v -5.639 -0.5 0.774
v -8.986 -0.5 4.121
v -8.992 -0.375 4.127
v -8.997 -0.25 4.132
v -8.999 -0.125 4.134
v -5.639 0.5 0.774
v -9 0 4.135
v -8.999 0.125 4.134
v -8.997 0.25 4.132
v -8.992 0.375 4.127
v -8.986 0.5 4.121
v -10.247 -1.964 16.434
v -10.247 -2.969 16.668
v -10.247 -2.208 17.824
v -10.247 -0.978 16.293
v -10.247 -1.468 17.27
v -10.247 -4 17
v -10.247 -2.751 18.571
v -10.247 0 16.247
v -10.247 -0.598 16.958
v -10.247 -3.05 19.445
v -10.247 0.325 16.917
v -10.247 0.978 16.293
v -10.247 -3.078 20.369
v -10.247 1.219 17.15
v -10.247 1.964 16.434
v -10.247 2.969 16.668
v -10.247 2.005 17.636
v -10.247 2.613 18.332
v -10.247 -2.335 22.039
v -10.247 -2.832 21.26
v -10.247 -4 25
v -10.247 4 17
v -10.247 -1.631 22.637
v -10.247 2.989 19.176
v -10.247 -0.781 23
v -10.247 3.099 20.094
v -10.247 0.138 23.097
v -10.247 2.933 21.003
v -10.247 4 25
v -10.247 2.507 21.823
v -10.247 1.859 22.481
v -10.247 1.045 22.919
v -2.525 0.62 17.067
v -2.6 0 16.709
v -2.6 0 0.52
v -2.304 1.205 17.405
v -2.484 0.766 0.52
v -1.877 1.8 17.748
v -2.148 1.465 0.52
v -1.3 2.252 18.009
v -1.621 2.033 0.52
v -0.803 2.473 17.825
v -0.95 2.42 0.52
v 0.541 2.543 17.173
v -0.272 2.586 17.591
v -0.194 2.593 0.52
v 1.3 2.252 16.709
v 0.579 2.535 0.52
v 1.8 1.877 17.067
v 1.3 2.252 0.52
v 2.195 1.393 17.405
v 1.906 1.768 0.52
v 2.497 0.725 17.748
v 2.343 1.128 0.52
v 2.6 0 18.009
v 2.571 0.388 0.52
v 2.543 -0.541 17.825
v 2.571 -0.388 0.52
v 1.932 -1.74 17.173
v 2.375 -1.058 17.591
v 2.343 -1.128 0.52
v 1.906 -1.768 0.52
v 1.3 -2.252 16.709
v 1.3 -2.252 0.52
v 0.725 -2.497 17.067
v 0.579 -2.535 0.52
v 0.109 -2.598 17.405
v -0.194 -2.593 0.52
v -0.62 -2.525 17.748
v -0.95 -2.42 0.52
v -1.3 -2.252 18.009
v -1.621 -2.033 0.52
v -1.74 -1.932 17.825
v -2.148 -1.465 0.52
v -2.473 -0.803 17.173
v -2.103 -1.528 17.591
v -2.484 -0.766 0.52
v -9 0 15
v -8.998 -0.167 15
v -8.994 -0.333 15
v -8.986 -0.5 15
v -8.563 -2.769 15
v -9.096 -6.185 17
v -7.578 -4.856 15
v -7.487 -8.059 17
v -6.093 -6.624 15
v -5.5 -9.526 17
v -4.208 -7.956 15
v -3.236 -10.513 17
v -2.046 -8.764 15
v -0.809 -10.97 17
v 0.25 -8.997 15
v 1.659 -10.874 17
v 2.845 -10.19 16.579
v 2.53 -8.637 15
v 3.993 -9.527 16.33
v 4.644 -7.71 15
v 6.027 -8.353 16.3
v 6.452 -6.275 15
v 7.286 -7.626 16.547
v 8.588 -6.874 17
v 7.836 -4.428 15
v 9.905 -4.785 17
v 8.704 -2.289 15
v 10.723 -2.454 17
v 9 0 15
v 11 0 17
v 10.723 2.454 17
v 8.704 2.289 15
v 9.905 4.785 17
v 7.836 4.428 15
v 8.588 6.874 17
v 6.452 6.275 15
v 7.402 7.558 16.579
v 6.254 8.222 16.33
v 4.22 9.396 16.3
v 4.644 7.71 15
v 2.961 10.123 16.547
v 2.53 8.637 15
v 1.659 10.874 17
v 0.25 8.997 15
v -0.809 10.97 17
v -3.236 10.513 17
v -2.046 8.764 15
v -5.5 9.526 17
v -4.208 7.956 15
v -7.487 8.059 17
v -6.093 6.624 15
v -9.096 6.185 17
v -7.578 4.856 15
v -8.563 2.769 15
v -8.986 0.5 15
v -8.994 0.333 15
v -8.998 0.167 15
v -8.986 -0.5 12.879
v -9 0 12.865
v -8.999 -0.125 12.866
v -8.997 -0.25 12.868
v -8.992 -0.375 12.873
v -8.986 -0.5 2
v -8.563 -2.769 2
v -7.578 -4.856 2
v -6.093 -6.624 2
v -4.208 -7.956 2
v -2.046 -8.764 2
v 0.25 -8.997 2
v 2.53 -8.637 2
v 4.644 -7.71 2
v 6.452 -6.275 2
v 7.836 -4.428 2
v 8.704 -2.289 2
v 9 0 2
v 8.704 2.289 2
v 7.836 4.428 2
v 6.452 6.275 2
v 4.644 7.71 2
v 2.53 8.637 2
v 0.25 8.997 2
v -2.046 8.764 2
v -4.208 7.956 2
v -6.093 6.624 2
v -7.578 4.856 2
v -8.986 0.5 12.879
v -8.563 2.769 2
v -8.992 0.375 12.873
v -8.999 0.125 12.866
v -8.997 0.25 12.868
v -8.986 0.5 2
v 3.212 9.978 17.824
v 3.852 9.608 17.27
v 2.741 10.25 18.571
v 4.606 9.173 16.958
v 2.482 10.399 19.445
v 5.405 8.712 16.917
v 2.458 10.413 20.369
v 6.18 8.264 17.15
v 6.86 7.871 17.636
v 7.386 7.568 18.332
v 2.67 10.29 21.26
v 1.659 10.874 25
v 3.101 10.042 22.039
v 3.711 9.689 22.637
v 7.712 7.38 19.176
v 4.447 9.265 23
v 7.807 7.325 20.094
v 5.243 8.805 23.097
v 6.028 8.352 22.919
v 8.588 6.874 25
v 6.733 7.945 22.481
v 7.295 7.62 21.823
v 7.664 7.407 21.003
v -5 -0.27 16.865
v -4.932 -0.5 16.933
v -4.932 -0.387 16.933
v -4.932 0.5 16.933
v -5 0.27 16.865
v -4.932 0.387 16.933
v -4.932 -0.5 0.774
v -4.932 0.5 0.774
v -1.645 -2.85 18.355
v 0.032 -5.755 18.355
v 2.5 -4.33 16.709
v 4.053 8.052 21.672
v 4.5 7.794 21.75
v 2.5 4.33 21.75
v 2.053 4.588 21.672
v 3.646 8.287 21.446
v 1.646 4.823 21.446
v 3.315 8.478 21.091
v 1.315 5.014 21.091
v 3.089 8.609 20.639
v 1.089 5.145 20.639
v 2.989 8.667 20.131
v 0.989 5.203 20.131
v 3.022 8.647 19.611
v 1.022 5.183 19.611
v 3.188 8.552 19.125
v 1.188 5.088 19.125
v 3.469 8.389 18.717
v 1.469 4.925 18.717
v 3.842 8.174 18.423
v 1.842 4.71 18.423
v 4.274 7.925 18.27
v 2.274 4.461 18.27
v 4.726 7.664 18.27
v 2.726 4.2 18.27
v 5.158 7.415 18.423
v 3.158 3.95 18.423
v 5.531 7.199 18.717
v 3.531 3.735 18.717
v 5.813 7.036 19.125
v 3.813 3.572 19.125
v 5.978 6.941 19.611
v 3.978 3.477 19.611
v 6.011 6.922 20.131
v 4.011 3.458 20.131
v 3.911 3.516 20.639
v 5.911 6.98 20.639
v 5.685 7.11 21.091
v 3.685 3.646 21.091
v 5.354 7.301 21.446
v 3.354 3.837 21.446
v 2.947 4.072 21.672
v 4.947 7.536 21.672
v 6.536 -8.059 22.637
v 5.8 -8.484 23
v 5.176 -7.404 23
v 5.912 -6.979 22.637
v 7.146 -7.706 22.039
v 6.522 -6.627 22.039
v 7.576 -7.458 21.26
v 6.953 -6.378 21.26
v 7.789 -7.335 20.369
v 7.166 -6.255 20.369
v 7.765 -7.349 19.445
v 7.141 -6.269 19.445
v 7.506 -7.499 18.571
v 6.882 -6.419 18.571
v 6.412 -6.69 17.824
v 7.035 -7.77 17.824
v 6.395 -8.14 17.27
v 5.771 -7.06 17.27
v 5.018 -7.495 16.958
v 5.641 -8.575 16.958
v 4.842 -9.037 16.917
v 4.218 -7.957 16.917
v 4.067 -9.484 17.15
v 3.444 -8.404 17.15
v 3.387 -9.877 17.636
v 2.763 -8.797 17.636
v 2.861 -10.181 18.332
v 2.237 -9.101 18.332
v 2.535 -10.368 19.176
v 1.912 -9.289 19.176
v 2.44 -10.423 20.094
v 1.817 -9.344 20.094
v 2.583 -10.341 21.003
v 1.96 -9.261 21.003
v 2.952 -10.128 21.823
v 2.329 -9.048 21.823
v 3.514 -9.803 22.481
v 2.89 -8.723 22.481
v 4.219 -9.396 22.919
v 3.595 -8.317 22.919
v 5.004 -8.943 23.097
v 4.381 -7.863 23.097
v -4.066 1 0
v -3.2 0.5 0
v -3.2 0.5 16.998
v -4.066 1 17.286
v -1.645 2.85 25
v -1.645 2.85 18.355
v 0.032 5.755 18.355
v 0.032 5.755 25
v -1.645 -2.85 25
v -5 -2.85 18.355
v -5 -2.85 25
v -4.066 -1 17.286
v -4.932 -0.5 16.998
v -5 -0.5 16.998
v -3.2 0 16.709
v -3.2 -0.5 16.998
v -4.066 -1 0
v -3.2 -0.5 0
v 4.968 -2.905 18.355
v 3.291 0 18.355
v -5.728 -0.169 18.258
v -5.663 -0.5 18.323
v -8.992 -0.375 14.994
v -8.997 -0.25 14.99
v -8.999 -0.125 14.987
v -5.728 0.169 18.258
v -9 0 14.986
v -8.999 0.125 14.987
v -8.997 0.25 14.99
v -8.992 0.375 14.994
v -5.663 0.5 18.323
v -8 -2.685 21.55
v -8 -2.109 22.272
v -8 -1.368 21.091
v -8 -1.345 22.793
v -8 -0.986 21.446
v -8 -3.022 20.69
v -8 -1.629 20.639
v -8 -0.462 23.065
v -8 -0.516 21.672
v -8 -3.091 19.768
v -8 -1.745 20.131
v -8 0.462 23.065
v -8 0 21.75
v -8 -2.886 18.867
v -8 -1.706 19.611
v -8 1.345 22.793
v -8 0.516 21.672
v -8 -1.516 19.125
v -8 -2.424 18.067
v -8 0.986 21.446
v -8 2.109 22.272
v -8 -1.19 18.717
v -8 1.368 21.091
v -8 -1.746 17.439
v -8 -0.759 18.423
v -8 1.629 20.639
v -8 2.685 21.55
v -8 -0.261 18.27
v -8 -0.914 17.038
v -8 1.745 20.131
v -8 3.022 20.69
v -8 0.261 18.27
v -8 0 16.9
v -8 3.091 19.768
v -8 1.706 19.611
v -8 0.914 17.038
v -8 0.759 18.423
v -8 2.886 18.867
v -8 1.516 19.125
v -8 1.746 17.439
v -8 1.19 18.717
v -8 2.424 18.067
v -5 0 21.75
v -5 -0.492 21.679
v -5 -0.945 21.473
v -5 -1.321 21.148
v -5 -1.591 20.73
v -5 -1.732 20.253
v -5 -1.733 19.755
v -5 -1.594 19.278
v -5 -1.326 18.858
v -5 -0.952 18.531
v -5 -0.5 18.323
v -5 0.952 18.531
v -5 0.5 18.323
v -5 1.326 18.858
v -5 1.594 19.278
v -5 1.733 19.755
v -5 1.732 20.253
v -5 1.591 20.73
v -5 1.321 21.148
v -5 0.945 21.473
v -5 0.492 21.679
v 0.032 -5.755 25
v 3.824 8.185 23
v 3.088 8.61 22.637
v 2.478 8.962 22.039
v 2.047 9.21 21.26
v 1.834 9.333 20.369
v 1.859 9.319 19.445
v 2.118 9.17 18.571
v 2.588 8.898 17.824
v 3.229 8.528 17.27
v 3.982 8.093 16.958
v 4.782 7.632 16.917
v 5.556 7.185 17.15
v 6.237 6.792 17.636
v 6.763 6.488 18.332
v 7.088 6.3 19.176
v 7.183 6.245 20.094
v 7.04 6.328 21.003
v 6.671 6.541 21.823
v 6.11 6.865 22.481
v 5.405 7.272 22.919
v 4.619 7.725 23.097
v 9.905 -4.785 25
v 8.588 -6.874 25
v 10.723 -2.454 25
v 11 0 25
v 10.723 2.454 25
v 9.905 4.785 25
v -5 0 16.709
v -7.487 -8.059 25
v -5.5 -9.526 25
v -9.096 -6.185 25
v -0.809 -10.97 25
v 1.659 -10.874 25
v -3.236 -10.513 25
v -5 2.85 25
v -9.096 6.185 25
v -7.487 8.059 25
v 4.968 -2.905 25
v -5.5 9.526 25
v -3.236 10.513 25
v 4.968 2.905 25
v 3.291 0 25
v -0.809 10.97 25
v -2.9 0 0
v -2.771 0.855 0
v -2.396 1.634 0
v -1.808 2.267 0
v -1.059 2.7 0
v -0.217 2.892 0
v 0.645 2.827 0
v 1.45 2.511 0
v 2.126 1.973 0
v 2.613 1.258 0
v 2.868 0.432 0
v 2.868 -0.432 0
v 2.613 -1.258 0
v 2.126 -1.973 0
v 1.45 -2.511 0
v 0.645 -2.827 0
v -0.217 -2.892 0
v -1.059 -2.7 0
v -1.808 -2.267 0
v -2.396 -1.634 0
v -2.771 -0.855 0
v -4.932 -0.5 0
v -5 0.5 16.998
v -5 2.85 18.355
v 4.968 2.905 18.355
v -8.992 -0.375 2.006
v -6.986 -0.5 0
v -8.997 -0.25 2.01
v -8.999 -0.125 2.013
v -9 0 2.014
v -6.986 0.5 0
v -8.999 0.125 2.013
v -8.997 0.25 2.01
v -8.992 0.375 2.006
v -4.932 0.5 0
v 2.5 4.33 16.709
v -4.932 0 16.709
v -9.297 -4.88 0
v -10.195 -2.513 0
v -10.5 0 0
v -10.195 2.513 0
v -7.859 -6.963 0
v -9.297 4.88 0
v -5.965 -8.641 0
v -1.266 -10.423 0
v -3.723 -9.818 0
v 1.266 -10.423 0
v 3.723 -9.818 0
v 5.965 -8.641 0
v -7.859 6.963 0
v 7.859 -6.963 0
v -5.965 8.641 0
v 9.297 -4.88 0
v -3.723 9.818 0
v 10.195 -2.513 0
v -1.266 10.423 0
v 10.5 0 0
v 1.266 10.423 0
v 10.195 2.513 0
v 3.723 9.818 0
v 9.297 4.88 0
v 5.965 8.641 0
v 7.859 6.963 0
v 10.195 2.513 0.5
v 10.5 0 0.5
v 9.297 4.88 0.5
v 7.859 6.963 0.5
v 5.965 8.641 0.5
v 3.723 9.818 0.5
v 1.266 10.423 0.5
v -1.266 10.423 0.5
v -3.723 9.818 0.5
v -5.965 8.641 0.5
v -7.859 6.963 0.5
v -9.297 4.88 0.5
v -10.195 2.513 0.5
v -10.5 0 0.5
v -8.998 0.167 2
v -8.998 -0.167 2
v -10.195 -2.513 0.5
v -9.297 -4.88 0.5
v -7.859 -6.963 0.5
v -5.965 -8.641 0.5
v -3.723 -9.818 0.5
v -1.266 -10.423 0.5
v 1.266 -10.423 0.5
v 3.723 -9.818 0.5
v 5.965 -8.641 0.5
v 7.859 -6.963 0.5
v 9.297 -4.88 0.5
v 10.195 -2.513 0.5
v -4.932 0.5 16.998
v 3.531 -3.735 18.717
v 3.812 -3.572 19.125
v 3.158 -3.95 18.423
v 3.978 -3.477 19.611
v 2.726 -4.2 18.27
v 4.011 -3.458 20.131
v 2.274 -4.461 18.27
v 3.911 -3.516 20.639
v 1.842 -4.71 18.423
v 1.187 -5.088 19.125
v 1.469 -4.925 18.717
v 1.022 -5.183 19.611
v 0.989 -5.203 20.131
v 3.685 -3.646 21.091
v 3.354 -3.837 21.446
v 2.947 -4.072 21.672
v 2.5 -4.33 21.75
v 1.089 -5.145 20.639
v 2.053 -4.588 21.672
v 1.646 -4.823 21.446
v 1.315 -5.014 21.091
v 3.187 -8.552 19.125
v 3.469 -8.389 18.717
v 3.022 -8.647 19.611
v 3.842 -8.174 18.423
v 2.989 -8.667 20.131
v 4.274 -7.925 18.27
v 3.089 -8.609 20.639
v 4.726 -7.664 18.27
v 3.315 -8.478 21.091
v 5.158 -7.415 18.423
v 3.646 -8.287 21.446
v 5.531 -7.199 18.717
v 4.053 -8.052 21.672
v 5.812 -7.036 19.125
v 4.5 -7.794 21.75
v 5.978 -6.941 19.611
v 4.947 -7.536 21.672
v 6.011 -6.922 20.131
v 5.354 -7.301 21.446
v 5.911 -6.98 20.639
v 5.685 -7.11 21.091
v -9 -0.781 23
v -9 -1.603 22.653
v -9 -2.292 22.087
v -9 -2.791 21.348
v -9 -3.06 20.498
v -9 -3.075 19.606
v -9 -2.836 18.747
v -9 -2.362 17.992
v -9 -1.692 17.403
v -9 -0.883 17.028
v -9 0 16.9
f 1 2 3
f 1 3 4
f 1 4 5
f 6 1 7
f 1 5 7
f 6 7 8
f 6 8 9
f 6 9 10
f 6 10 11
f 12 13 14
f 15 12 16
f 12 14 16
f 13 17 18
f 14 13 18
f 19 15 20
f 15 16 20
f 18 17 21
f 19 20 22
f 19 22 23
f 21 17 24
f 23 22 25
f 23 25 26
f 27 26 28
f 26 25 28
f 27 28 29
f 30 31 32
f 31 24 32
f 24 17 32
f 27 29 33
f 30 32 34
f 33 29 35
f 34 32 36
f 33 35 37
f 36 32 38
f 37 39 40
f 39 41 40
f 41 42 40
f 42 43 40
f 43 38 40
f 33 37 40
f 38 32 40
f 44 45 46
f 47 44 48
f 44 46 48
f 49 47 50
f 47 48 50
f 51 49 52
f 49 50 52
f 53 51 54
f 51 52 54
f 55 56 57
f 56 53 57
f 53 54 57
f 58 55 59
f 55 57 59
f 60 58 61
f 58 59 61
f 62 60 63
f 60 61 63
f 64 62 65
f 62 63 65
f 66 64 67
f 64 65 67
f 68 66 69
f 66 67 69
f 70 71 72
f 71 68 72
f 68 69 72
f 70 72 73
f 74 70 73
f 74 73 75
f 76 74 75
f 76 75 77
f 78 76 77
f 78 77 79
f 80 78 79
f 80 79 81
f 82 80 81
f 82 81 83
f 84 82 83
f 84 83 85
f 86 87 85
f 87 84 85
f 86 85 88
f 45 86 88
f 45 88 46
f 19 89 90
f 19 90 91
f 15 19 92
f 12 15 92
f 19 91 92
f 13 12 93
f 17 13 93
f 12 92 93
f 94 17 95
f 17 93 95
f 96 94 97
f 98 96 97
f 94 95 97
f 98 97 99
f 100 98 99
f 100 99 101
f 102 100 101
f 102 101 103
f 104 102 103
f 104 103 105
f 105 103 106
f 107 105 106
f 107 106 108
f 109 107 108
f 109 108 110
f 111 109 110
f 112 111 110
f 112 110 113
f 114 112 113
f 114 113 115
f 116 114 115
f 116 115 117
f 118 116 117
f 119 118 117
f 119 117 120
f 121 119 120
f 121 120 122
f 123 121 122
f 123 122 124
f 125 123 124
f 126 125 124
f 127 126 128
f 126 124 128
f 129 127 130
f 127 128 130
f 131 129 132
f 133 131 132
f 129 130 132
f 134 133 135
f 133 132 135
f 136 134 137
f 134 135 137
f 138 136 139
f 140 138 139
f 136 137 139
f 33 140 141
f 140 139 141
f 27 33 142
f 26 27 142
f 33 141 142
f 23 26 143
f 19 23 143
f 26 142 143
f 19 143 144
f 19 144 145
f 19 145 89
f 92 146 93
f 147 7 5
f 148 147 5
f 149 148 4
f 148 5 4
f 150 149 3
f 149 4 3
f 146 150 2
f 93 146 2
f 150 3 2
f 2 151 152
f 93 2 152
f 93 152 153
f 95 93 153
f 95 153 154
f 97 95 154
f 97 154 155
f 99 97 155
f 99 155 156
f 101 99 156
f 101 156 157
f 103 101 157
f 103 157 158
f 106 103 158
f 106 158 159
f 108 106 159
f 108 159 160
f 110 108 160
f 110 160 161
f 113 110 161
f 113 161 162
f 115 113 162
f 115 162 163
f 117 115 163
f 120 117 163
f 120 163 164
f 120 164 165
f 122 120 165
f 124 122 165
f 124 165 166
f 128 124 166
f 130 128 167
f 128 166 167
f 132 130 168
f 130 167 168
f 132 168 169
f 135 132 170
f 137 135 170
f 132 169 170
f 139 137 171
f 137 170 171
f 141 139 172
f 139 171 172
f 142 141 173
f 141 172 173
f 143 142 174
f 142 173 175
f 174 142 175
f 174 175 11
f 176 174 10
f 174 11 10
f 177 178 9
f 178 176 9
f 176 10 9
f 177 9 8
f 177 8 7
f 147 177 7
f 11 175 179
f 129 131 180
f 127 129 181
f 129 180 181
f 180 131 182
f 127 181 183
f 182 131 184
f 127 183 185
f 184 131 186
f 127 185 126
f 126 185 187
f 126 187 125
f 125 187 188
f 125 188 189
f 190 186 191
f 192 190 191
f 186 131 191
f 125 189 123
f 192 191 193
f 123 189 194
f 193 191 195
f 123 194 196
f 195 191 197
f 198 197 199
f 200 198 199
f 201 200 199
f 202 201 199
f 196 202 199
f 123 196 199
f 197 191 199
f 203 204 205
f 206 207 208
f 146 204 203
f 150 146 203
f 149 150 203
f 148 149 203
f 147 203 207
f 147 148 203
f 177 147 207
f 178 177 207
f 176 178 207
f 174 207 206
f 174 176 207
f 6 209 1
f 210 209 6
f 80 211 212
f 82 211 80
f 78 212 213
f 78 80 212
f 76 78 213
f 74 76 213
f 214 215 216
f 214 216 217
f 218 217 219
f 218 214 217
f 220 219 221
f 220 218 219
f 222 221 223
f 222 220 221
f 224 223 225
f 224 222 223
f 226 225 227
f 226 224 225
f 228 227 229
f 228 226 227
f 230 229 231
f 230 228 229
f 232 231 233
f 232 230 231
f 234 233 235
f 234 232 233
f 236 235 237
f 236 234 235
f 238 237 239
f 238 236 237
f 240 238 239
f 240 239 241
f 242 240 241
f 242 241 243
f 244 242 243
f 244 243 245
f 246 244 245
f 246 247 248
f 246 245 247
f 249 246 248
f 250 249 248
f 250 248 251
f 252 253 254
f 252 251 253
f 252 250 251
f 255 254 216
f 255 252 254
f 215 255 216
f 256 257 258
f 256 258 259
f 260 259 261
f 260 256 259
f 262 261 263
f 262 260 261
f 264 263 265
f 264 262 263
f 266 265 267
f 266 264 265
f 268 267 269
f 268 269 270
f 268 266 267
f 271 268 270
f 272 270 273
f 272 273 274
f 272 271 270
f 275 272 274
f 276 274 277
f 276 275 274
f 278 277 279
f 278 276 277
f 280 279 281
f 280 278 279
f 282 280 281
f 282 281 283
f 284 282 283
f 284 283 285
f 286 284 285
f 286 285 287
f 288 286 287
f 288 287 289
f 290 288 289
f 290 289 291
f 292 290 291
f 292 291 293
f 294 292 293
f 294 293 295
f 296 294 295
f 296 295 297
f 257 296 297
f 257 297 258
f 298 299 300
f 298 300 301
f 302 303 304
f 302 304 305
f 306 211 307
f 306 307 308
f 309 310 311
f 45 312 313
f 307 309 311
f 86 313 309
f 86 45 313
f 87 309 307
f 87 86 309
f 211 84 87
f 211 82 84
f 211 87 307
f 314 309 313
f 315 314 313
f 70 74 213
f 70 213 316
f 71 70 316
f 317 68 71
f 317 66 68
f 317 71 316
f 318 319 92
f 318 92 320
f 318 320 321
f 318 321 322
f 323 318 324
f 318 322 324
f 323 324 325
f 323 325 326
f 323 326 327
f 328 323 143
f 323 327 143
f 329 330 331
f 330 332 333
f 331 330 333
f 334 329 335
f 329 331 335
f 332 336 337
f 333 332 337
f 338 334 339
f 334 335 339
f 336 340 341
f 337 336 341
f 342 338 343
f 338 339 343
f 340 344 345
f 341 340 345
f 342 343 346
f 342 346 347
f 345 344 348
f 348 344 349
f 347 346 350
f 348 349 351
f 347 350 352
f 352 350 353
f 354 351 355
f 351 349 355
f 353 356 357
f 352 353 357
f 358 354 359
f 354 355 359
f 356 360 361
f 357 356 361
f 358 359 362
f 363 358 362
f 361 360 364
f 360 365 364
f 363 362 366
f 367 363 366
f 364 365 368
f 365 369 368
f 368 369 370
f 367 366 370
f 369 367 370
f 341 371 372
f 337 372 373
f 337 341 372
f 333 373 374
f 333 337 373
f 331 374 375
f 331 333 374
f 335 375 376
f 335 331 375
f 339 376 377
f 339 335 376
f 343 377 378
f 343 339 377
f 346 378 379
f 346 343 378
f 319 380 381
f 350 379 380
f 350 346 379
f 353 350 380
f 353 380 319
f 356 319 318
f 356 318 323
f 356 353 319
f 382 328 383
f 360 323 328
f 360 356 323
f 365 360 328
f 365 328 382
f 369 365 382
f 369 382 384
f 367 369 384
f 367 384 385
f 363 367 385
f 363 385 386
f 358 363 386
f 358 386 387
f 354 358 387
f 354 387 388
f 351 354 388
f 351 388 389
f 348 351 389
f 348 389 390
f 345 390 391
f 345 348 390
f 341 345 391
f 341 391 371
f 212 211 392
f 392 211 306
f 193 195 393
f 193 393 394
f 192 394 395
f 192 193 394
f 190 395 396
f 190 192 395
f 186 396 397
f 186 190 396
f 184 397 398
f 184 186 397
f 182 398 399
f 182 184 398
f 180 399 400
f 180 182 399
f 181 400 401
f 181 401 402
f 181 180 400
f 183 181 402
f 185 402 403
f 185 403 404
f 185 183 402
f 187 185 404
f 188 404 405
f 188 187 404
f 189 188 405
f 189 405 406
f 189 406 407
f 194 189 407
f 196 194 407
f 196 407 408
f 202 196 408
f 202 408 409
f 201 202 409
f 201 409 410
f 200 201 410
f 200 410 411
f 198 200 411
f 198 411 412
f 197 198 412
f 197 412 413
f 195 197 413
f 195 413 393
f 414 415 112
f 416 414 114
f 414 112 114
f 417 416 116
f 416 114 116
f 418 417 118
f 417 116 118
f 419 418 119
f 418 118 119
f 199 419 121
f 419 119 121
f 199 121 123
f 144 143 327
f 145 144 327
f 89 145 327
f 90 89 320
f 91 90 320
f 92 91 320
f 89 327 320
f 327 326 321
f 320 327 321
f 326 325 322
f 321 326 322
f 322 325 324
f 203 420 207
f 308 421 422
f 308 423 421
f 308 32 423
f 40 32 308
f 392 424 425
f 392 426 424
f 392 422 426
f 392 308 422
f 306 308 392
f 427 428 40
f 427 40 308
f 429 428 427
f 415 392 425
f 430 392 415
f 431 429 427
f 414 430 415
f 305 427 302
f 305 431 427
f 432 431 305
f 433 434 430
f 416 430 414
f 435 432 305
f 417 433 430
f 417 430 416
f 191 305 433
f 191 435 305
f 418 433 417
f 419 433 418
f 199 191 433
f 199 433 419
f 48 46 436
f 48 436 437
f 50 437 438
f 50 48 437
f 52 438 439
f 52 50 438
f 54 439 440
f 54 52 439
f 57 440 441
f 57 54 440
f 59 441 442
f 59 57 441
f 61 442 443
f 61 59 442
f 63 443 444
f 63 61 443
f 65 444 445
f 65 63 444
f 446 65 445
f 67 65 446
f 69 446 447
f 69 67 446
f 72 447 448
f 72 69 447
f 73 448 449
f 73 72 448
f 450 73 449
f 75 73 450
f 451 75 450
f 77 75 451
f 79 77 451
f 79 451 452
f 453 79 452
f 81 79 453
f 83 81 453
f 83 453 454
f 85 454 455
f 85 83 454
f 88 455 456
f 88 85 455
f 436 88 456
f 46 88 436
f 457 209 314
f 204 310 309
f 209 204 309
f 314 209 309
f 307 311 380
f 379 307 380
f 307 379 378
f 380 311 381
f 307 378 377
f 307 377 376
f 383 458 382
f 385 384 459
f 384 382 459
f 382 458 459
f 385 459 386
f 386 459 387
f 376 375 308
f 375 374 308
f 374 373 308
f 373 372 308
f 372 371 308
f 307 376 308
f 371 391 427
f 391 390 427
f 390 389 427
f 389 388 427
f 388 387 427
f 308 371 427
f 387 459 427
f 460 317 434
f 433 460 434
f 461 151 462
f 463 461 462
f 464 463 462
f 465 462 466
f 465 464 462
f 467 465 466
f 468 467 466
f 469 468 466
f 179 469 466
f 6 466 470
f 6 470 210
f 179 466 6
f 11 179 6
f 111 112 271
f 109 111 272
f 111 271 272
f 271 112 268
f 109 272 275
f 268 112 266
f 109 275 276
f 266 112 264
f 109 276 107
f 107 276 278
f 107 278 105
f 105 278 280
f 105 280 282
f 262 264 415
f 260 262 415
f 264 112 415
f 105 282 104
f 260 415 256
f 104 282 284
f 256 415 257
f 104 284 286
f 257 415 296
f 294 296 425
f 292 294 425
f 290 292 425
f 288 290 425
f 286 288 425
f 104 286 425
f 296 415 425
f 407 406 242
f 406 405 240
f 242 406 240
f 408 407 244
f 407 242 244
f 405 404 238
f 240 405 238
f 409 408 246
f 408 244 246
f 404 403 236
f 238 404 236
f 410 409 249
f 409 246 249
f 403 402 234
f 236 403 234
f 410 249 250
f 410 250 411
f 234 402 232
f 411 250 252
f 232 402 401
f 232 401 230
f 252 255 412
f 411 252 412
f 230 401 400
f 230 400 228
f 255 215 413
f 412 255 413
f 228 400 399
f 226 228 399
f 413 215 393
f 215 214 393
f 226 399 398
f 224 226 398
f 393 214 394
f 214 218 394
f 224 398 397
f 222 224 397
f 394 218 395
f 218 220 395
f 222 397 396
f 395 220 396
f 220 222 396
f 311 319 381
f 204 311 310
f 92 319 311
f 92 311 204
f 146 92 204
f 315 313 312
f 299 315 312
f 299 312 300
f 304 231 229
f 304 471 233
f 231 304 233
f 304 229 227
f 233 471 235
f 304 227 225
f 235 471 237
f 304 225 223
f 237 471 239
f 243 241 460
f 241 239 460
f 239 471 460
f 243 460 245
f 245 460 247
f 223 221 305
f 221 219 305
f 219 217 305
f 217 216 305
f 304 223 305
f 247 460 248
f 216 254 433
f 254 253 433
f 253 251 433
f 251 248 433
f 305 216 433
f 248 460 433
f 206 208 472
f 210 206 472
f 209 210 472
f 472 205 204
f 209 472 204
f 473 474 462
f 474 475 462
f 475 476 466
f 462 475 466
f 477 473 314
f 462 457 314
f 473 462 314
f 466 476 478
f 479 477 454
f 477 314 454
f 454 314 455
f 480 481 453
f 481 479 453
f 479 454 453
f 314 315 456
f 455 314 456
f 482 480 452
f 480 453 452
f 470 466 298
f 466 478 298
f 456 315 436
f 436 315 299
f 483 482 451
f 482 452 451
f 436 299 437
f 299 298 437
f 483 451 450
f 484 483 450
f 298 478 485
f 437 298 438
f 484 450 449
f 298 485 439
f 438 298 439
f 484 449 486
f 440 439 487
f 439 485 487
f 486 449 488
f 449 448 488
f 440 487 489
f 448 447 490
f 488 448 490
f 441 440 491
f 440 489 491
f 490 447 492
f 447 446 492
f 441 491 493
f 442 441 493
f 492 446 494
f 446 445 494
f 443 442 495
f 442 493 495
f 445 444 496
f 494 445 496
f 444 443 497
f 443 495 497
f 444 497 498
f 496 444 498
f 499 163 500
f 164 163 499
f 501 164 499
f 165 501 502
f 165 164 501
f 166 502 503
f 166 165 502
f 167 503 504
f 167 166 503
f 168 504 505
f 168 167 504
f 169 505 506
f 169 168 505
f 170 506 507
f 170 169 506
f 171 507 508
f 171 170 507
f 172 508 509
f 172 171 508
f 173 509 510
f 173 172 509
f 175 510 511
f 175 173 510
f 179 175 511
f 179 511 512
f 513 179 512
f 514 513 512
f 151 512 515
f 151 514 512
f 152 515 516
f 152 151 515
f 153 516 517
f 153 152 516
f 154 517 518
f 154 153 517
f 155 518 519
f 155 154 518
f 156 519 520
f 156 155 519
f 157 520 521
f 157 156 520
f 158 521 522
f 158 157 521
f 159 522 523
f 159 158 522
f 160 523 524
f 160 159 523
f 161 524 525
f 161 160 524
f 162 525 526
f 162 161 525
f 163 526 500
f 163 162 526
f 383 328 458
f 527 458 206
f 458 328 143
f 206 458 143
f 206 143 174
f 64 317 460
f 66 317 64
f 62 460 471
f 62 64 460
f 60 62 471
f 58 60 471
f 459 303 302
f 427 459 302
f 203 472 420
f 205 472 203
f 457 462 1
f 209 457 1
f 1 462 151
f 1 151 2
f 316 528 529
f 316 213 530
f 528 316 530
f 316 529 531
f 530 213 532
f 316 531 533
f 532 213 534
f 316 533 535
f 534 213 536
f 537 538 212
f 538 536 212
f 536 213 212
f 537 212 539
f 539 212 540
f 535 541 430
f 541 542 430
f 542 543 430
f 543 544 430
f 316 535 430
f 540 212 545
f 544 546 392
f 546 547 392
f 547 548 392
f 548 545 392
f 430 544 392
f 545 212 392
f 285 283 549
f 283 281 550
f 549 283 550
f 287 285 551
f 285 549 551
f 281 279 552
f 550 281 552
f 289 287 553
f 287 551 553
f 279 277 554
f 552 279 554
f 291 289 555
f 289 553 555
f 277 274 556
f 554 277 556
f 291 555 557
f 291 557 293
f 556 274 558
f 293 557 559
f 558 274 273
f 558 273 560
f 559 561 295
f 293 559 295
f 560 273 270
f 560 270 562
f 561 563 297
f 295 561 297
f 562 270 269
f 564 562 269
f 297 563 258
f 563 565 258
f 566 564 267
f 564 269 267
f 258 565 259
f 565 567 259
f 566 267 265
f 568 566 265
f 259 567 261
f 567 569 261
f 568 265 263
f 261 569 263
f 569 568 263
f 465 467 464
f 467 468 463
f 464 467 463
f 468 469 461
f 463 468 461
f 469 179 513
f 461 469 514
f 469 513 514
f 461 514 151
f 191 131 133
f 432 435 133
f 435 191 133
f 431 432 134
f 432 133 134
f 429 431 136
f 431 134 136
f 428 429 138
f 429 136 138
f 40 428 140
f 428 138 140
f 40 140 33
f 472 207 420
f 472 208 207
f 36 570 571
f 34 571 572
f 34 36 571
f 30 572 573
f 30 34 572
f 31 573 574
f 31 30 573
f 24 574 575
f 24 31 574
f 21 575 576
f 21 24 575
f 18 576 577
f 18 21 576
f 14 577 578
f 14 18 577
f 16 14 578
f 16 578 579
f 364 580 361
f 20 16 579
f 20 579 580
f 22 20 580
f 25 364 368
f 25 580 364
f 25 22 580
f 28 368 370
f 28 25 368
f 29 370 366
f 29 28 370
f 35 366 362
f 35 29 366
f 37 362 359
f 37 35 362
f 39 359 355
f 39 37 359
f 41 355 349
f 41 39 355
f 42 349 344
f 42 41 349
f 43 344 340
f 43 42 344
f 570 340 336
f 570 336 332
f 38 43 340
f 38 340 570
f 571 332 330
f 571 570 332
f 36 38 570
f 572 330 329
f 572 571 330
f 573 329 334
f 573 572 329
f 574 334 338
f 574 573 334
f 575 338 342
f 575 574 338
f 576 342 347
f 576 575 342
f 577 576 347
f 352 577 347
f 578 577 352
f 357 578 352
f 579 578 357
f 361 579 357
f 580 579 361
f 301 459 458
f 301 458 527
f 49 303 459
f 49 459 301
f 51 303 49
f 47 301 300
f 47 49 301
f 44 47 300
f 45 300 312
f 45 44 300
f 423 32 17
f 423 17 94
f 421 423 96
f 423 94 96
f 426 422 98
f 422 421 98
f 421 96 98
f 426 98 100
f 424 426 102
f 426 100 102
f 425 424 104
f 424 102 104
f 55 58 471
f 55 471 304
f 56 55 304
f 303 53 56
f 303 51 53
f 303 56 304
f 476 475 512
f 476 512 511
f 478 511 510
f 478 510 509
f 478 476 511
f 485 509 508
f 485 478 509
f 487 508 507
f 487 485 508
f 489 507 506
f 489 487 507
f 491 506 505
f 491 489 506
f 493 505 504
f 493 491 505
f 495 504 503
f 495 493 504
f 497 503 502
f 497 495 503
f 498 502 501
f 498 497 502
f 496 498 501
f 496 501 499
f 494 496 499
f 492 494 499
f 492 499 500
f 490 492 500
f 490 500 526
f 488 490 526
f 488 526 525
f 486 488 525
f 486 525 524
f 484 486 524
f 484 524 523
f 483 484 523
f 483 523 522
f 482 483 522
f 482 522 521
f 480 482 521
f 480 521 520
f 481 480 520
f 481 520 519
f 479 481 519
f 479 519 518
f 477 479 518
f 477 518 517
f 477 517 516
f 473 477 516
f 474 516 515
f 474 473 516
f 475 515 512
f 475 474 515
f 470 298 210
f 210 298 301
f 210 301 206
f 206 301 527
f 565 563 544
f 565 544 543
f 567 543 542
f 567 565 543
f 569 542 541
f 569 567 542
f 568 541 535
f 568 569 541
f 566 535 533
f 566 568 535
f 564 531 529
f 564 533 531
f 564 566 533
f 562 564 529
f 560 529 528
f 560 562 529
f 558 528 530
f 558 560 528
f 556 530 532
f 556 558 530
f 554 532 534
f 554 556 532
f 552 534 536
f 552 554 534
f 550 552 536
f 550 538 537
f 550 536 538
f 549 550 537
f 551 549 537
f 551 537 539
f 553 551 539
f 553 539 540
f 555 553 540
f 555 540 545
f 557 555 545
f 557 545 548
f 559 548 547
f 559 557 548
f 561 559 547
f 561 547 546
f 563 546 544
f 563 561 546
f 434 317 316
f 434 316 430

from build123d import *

# Parameters (mm, degrees)
SKETCH1_R                     = 11
BOSS_BASE_FLANGE_DEPTH        = 2
BOSS_BASE_FLANGE_TAPER        = 45
SKETCH2_R                     = 9
BOSS_SPECTRA_SPOOL_DEPTH      = 13
SKETCH3_R                     = 9
BOSS_TOP_FLANGE_DEPTH         = 2
BOSS_TOP_FLANGE_DRAFT         = -45
SKETCH4_R                     = 11
BOSS_TOP_EXTENSION_DEPTH      = 8
SKETCH5_R                     = 2.6
CUT_STEPPER_SHAFT_DEPTH       = 30.444863729
CUT_SET_SCREW_HOLE_REACH      = 37.071
CUT_SET_SCREW_HOLE_END_RADIUS = 2.6
SKETCH7_R                     = 1.75
SKETCH8_R                     = 3.1
CUT_SCREW_HEAD_SLOT_DEPTH     = 2
CUT_FLATEN_REACH              = 31.445
SKETCH6_W                     = 0.753049234
SKETCH6_H                     = 8
CUT_NUT_HOLE_DEPTH            = 5
SKETCH11_W                    = 3.354551733
SKETCH11_H                    = 5.7
CUT_NUT_SLOT_DEPTH            = 5
CIRPATTERN1_COUNT             = 3
CUT_THREAD_HOLE_DEPTH         = 30.444863729
SKETCH15_W                    = 1.5
SKETCH15_H                    = 1
CUT_EXTRUDE8_DEPTH            = 28.81186797
CHAMFER1_SIZE                 = 1
CHAMFER1_SIZE2                = 0.707106781
CHAMFER3_SIZE                 = 0.3
CHAMFER3_SIZE2                = 0.519615242
SKETCH16_OUTSIDE_W            = 31.982
SKETCH16_OUTSIDE_H            = 31.982
SKETCH16_OUTSIDE_R            = 10.5
CUT_TRUNCATE_BASE_DEPTH       = 5
SKETCH8_2_R                   = 3.1
CUT_EXTRUDE9_DEPTH            = 3


with BuildPart() as part:
    # Sketch1 → Boss-Base Flange (new body)
    with BuildSketch(Plane.XY):
        Circle(SKETCH1_R)
    extrude(amount=BOSS_BASE_FLANGE_DEPTH, taper=BOSS_BASE_FLANGE_TAPER)

    # Sketch2 → Boss-Spectra Spool (add)
    with BuildSketch(Plane.XY.offset(2)):
        with Locations(Location((0, 0, 0), (0, 0, 180))):
            Circle(SKETCH2_R)
    extrude(amount=BOSS_SPECTRA_SPOOL_DEPTH)


with BuildPart() as boss_top_flange_tool:
    # Sketch3 → Boss-Top Flange (with draft: the straight prism first)
    with BuildSketch(Plane.XY.offset(15)):
        with Locations(Location((0, 0, 0), (0, 0, 180))):
            Circle(SKETCH3_R)
    extrude(amount=BOSS_TOP_FLANGE_DEPTH)
    # Boss-Top Flange: the draft: its side faces are tilted about the plane it starts from
    boss_top_flange_sides = [boss_top_flange_tool.faces().sort_by_distance(p)[0] for p in [
        (9, 0, 16),
    ]]
    draft(boss_top_flange_sides, Plane.XY.offset(15), BOSS_TOP_FLANGE_DRAFT)


with BuildPart() as part_1:
    add(part.part)

    # Boss-Top Flange: add boss_top_flange_tool
    add(boss_top_flange_tool.part)

    # Sketch4 → Boss-Top Extension (add)
    with BuildSketch(Plane.XY.offset(17)):
        Circle(SKETCH4_R)
    extrude(amount=BOSS_TOP_EXTENSION_DEPTH)

    # Sketch5 → Cut-Stepper Shaft (cut, through all)
    with BuildSketch(Plane(origin=(0, 0, 0), x_dir=(-1, 0, 0), z_dir=(0, 0, -1))):
        Circle(SKETCH5_R)
    extrude(amount=-CUT_STEPPER_SHAFT_DEPTH, mode=Mode.SUBTRACT)

    # Cut-Set Screw Hole: up to this cylinder (the profile starts outside it)
    cut_set_screw_hole_end = Plane(origin=(0, 0, 20), z_dir=(0, 0, -1)) * Cylinder(CUT_SET_SCREW_HOLE_END_RADIUS, 80.342, mode=Mode.PRIVATE)
    # Sketch7 → Cut-Set Screw Hole (cut, up to the surface)
    with BuildSketch(Plane(origin=(-11, 0, 0), x_dir=(0, 0, -1), z_dir=(1, 0, 0)), mode=Mode.PRIVATE) as cut_set_screw_hole_sk1:
        with Locations(Location((-20, 0, 0), (0, 0, 180))):
            Circle(SKETCH7_R)
    cut_set_screw_hole_tool1 = extrude(cut_set_screw_hole_sk1.sketch, amount=CUT_SET_SCREW_HOLE_REACH, mode=Mode.PRIVATE) - cut_set_screw_hole_end
    cut_set_screw_hole = cut_set_screw_hole_tool1.solids().sort_by_distance((-11, 0, 20))[0]
    add(cut_set_screw_hole, mode=Mode.SUBTRACT)

    # Sketch8 → Cut-Screw Head Slot (cut)
    with BuildSketch(Plane(origin=(-11, 0, 0), x_dir=(0, 0, -1), z_dir=(1, 0, 0))):
        with Locations(Location((-20, 0, 0), (0, 0, 194.592594316))):
            Circle(SKETCH8_R)
    cut_screw_head_slot = extrude(amount=CUT_SCREW_HEAD_SLOT_DEPTH, mode=Mode.SUBTRACT)

    # Cut-Flaten: up to this cone (the profile starts inside it)
    cut_flaten_end = Plane(origin=(0, 0, 25), z_dir=(0, 0, 1)).offset(-18.999999) * Cone(1e-06, 69.945, 69.944999, align=(Align.CENTER, Align.CENTER, Align.MIN), mode=Mode.PRIVATE)
    # Sketch6 → Cut-Flaten (cut, up to the surface)
    with BuildSketch(Plane.XY.offset(25), mode=Mode.PRIVATE) as cut_flaten_sk1:
        with Locations((-10.623475383, 0)):
            Rectangle(SKETCH6_W, SKETCH6_H)
    cut_flaten_tool1 = extrude(cut_flaten_sk1.sketch, amount=-CUT_FLATEN_REACH, mode=Mode.PRIVATE) & cut_flaten_end
    cut_flaten = cut_flaten_tool1.solids().sort_by_distance((-10.623475, 0, 25))[0]
    add(cut_flaten, mode=Mode.SUBTRACT)

    # Sketch10 → Cut-Nut Hole (cut)
    with BuildSketch(Plane.ZY):
        Polygon((23.290896534, 0), (21.645448267, 2.85), (18.354551733, 2.85), (16.709103466, 0), (18.354551733, -2.85), (21.645448267, -2.85), align=None)
    cut_nut_hole = extrude(amount=CUT_NUT_HOLE_DEPTH, mode=Mode.SUBTRACT)

    # Sketch11 → Cut-Nut Slot (cut)
    with BuildSketch(Plane.ZY):
        with Locations((23.322724134, 0)):
            Rectangle(SKETCH11_W, SKETCH11_H)
    cut_nut_slot = extrude(amount=CUT_NUT_SLOT_DEPTH, mode=Mode.SUBTRACT)

    # CirPattern1: Cut-Set Screw Hole, Cut-Screw Head Slot, Cut-Flaten, Cut-Nut Hole, Cut-Nut Slot ×3 about axis
    cirpattern1_axis = Axis((0, 0, 0), (0, 0, 1))
    add([cut_set_screw_hole.rotate(cirpattern1_axis, i * 360 / CIRPATTERN1_COUNT) for i in range(1, CIRPATTERN1_COUNT)], mode=Mode.SUBTRACT)
    add([cut_screw_head_slot.rotate(cirpattern1_axis, i * 360 / CIRPATTERN1_COUNT) for i in range(1, CIRPATTERN1_COUNT)], mode=Mode.SUBTRACT)
    add([cut_flaten.rotate(cirpattern1_axis, i * 360 / CIRPATTERN1_COUNT) for i in range(1, CIRPATTERN1_COUNT)], mode=Mode.SUBTRACT)
    add([cut_nut_hole.rotate(cirpattern1_axis, i * 360 / CIRPATTERN1_COUNT) for i in range(1, CIRPATTERN1_COUNT)], mode=Mode.SUBTRACT)
    add([cut_nut_slot.rotate(cirpattern1_axis, i * 360 / CIRPATTERN1_COUNT) for i in range(1, CIRPATTERN1_COUNT)], mode=Mode.SUBTRACT)

    # Sketch13 → Cut-Thread Hole (cut, through all)
    with BuildSketch(Plane.XY.offset(25)):
        Polygon((-4.066025404, 1), (-4.932050808, 0.5), (-4.932050808, -0.5), (-4.066025404, -1), (-3.2, -0.5), (-3.2, 0.5), align=None)
    extrude(amount=-CUT_THREAD_HOLE_DEPTH, mode=Mode.SUBTRACT)

    # Sketch15 → Cut-Extrude8 (cut, symmetric)
    with BuildSketch(Plane(origin=(-5.5, 0, 5.5), x_dir=(0.7071067811865464, 0, 0.7071067811865488), z_dir=(-0.7071067811865488, 0, 0.7071067811865464))):
        with Locations((-4.189918951, 0)):
            Rectangle(SKETCH15_W, SKETCH15_H)
    cut_extrude8 = extrude(amount=CUT_EXTRUDE8_DEPTH, both=True, mode=Mode.SUBTRACT)

    # Chamfer1
    chamfer1_edges = [part_1.edges().sort_by_distance(p)[0] for p in [
        (-4.932050808, 0, 0.067270773),
    ]]
    chamfer1_side = [part_1.faces().sort_by_distance(p)[0] for p in [
        (-6.963711629, 0, 2.098931595),
    ]]
    chamfer(chamfer1_edges, length=CHAMFER1_SIZE, length2=CHAMFER1_SIZE2, reference=chamfer1_side[0])

    # Mirror1: Cut-Extrude8 across plane
    add(cut_extrude8.mirror(Plane.XY.offset(8.5)), mode=Mode.SUBTRACT)

    # Chamfer3
    chamfer3_edges = [part_1.edges().sort_by_distance(p)[0] for p in [
        (2.6, 0, 0),
    ]]
    chamfer3_side = [part_1.faces().sort_by_distance(p)[0] for p in [
        (-10.688873016, 0, 0),
    ]]
    chamfer(chamfer3_edges, length=CHAMFER3_SIZE, length2=CHAMFER3_SIZE2, reference=chamfer3_side[0])

    # Sketch16 outside → Cut-Truncate Base (cut)
    with BuildSketch(Plane(origin=(0, 0, 0), x_dir=(-1, 0, 0), z_dir=(0, 0, -1))):
        Rectangle(SKETCH16_OUTSIDE_W, SKETCH16_OUTSIDE_H)
        Circle(SKETCH16_OUTSIDE_R, mode=Mode.SUBTRACT)
    extrude(amount=-CUT_TRUNCATE_BASE_DEPTH, mode=Mode.SUBTRACT)

    # Sketch8<2> → Cut-Extrude9 (cut)
    with BuildSketch(Plane(origin=(-11, 0, 0), x_dir=(0, 0, -1), z_dir=(1, 0, 0))):
        with Locations((-20, 0)):
            Circle(SKETCH8_2_R)
    extrude(amount=CUT_EXTRUDE9_DEPTH, mode=Mode.SUBTRACT)


solid = part_1.part
